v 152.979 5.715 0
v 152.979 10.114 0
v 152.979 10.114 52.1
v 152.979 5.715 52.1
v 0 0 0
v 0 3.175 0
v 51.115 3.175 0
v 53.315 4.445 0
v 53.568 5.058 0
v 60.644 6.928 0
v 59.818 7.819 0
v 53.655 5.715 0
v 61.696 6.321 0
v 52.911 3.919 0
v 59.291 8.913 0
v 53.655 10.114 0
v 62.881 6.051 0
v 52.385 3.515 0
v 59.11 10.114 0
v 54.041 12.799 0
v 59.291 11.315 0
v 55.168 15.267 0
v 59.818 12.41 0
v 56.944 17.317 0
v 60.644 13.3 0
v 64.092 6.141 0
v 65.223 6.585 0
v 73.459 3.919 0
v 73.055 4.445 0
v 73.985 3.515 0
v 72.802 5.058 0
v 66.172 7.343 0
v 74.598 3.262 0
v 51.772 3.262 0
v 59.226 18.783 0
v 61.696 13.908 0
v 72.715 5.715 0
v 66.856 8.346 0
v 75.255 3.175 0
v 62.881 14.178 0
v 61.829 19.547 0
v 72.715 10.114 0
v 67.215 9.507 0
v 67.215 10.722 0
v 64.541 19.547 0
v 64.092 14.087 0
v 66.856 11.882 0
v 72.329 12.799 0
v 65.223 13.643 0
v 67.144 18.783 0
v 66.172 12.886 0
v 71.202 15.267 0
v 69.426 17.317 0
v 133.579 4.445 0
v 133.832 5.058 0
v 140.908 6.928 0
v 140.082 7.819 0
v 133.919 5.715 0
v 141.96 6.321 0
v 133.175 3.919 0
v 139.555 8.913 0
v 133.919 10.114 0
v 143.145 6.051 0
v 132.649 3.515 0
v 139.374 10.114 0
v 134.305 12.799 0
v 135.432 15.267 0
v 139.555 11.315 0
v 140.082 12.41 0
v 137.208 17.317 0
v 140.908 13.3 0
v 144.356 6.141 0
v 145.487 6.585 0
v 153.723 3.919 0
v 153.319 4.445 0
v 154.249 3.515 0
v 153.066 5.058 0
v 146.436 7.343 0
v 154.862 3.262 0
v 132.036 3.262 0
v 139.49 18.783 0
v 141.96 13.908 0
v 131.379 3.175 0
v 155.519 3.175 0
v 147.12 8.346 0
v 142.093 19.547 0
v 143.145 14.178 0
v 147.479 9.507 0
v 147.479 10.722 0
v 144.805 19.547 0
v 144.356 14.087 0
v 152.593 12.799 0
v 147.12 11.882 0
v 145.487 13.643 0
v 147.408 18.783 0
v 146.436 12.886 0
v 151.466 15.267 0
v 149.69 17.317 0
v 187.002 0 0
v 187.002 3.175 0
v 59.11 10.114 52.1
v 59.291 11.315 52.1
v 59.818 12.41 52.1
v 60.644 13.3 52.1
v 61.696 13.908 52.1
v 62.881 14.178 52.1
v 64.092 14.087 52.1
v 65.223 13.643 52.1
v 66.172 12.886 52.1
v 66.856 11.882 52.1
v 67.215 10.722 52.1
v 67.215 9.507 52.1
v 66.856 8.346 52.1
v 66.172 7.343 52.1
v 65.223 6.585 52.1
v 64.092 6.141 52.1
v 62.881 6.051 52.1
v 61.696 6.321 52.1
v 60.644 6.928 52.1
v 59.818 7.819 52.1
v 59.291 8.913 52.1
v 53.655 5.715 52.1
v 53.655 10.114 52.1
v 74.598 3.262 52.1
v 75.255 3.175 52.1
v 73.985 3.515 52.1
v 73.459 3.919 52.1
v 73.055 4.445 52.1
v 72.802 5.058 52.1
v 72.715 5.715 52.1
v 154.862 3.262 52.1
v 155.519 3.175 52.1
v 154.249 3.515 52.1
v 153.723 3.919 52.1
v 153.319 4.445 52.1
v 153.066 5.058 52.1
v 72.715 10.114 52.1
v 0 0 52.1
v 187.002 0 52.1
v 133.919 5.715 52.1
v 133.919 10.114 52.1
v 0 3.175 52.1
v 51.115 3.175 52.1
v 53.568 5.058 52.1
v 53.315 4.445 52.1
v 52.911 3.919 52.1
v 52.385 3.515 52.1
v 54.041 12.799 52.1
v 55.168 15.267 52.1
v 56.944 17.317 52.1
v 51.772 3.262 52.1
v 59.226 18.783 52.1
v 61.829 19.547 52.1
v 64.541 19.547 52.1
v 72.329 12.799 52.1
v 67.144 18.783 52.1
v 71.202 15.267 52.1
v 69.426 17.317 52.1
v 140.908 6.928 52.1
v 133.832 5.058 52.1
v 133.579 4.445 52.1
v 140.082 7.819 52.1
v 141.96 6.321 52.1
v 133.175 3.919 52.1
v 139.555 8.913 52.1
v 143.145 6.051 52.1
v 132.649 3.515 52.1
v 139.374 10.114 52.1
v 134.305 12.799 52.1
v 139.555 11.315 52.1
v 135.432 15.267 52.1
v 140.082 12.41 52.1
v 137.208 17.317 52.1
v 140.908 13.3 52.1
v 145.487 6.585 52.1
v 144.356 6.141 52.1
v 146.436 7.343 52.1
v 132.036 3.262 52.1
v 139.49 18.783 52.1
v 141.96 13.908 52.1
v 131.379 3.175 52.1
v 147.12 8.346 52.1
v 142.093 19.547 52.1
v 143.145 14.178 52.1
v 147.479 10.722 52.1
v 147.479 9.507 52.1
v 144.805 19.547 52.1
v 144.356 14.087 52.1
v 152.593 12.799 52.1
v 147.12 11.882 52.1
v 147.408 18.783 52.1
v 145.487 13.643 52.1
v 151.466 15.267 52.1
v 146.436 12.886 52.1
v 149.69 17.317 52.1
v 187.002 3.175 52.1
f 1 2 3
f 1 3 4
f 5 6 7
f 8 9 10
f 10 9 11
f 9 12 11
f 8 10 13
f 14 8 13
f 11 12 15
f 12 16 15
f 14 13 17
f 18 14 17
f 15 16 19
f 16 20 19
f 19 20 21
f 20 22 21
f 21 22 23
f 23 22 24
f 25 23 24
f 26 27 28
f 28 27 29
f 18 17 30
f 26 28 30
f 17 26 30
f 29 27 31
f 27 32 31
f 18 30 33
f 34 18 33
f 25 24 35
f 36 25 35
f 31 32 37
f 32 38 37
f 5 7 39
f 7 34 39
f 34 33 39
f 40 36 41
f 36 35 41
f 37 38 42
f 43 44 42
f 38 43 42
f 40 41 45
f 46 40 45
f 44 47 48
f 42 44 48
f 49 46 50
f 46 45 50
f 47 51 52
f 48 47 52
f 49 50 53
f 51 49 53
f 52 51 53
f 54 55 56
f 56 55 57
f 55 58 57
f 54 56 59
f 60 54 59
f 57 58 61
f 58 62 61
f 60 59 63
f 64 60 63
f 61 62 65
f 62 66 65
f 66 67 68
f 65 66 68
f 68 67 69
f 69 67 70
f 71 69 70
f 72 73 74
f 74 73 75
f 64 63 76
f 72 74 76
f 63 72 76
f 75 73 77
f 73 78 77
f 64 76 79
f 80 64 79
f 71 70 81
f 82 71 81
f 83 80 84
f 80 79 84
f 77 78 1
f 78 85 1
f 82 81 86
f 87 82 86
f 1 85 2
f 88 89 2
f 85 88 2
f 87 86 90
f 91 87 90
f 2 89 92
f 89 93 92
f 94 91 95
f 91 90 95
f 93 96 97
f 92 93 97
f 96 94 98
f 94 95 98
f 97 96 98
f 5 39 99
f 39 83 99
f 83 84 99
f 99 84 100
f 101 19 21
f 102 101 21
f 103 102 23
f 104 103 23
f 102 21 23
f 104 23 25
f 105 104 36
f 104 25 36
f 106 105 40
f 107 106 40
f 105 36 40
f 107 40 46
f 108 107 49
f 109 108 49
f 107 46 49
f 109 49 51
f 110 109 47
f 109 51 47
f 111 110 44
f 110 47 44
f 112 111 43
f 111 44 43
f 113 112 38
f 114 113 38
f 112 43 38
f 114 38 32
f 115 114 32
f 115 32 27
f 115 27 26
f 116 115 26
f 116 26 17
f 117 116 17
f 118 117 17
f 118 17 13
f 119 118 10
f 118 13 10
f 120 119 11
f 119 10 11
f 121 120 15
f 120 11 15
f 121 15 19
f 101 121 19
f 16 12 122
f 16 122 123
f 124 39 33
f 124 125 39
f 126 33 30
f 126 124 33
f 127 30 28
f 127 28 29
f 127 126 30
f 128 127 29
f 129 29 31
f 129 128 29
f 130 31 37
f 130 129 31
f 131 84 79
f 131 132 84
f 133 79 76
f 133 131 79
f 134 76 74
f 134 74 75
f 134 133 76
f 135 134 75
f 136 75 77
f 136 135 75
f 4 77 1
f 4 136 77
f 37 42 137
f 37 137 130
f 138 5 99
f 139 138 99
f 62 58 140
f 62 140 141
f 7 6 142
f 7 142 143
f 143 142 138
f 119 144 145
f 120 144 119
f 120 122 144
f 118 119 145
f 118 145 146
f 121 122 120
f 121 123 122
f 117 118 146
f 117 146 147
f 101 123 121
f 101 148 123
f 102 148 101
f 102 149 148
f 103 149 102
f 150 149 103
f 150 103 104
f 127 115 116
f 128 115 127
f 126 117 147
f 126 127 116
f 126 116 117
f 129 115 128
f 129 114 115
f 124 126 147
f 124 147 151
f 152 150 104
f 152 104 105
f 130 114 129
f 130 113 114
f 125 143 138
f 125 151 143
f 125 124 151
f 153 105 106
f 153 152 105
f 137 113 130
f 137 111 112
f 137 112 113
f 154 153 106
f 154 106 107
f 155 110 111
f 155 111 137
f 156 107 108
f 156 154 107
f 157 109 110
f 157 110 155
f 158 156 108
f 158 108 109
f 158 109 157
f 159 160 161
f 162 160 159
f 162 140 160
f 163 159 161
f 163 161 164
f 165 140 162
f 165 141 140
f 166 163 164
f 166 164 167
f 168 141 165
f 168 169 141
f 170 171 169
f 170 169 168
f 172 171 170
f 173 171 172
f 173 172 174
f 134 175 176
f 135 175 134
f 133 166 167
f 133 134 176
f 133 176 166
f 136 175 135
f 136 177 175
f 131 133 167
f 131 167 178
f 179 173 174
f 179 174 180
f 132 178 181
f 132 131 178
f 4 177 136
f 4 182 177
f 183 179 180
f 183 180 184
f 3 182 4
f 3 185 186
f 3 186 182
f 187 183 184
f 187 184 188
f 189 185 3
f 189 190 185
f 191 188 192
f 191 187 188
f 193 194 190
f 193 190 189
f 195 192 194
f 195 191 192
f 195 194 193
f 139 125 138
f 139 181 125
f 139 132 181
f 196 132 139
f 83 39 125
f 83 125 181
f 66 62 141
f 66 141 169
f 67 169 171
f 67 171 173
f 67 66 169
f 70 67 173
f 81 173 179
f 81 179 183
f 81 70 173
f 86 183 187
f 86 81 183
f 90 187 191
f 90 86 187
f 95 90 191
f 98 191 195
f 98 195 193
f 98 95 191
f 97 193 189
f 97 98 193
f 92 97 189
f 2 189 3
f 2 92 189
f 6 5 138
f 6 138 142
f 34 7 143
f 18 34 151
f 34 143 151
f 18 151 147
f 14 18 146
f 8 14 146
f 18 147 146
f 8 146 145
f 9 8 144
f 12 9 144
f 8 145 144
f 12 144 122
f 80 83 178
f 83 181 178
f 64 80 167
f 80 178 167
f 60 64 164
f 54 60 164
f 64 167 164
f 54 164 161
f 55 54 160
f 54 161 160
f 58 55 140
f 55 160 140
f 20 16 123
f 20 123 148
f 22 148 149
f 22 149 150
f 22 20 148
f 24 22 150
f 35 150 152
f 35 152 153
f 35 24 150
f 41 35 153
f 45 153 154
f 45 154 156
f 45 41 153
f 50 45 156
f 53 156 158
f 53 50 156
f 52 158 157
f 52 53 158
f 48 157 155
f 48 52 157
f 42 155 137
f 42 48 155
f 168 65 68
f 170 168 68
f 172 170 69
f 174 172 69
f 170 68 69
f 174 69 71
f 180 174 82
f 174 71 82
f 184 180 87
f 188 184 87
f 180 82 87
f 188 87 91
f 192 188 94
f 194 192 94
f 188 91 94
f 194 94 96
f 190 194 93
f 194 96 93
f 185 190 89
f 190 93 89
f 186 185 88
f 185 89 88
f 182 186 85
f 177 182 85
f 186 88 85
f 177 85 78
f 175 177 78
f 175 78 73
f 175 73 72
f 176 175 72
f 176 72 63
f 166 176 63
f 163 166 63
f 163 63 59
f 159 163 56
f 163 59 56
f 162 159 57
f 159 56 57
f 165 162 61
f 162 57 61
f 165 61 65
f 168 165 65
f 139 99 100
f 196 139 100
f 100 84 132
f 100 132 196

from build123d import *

# Parameters (mm, degrees)
SKETCH1_W           = 399.27784
SKETCH1_H           = 3.175
BOSS_EXTRUDE1_DEPTH = 52.09999994
SKETCH3_R           = 4.075
BOSS_EXTRUDE2_DEPTH = 52.09999994
FILLET1_R           = 2.54
SKETCH5_W           = 212.27542
SKETCH5_H           = 58.123397562
CUT_EXTRUDE3_DEPTH  = 404.141539965


with BuildPart() as part:
    # Sketch1 → Boss-Extrude1 (new body)
    with BuildSketch(Plane.XY):
        with Locations((199.63892, 1.5875)):
            Rectangle(SKETCH1_W, SKETCH1_H)
    extrude(amount=BOSS_EXTRUDE1_DEPTH)

    # Sketch3 → Boss-Extrude2 (add)
    # profile 1 of 4: a face of its own
    with BuildSketch(Plane(origin=(0, 0, 0), x_dir=(-1, 0, 0), z_dir=(0, 0, -1))):
        with BuildLine():
            Line((-313.50704, 10.11428), (-313.50704, 3.175))
            Line((-313.50704, 3.175), (-303.97704, 3.175))
            Line((-303.97704, 3.175), (-294.44704, 3.175))
            Line((-294.44704, 3.175), (-294.44704, 10.11428))
            ThreePointArc((-294.44704, 10.11428), (-303.97704, 19.64428), (-313.50704, 10.11428))
        make_face()
        with Locations((-303.97704, 10.11428)):
            Circle(SKETCH3_R, mode=Mode.SUBTRACT)
    # profile 2 of 4: a face of its own
    with BuildSketch(Plane(origin=(0, 0, 0), x_dir=(-1, 0, 0), z_dir=(0, 0, -1))):
        with BuildLine():
            Line((-233.24304, 3.175), (-223.71304, 3.175))
            Line((-223.71304, 3.175), (-214.18304, 3.175))
            Line((-214.18304, 3.175), (-214.18304, 10.11428))
            ThreePointArc((-214.18304, 10.11428), (-223.71304, 19.64428), (-233.24304, 10.11428))
            Line((-233.24304, 10.11428), (-233.24304, 3.175))
        make_face()
        with Locations((-223.71304, 10.11428)):
            Circle(SKETCH3_R, mode=Mode.SUBTRACT)
    # profile 3 of 4: a face of its own
    with BuildSketch(Plane(origin=(0, 0, 0), x_dir=(-1, 0, 0), z_dir=(0, 0, -1))):
        with BuildLine():
            Line((-152.97904, 3.175), (-143.44904, 3.175))
            Line((-143.44904, 3.175), (-133.91904, 3.175))
            Line((-133.91904, 3.175), (-133.91904, 10.11428))
            ThreePointArc((-133.91904, 10.11428), (-143.44904, 19.64428), (-152.97904, 10.11428))
            Line((-152.97904, 10.11428), (-152.97904, 3.175))
        make_face()
        with Locations((-143.44904, 10.11428)):
            Circle(SKETCH3_R, mode=Mode.SUBTRACT)
    # profile 4 of 4: a face of its own
    with BuildSketch(Plane(origin=(0, 0, 0), x_dir=(-1, 0, 0), z_dir=(0, 0, -1))):
        with BuildLine():
            Line((-72.71504, 3.175), (-63.18504, 3.175))
            Line((-63.18504, 3.175), (-53.65504, 3.175))
            Line((-53.65504, 3.175), (-53.65504, 10.11428))
            ThreePointArc((-53.65504, 10.11428), (-63.18504, 19.64428), (-72.71504, 10.11428))
            Line((-72.71504, 10.11428), (-72.71504, 3.175))
        make_face()
        with Locations((-63.18504, 10.11428)):
            Circle(SKETCH3_R, mode=Mode.SUBTRACT)
    extrude(amount=-BOSS_EXTRUDE2_DEPTH)

    # Fillet1
    fillet1_edges = [part.edges().sort_by_distance(p)[0] for p in [
        (294.44704, 3.175, 26.04999997),
        (313.50704, 3.175, 26.04999997),
        (233.24304, 3.175, 26.04999997),
        (214.18304, 3.175, 26.04999997),
        (152.97904, 3.175, 26.04999997),
        (133.91904, 3.175, 26.04999997),
        (72.71504, 3.175, 26.04999997),
        (53.65504, 3.175, 26.04999997),
    ]]
    fillet(fillet1_edges, radius=FILLET1_R)

    # Sketch5 → Cut-Extrude3 (cut, through all)
    with BuildSketch(Plane(origin=(0, 0, 0), x_dir=(-1, 0, 0), z_dir=(0, 0, -1))):
        with Locations((-293.14013, 29.061698781)):
            Rectangle(SKETCH5_W, SKETCH5_H)
    extrude(amount=-CUT_EXTRUDE3_DEPTH, mode=Mode.SUBTRACT)


solid = part.part
